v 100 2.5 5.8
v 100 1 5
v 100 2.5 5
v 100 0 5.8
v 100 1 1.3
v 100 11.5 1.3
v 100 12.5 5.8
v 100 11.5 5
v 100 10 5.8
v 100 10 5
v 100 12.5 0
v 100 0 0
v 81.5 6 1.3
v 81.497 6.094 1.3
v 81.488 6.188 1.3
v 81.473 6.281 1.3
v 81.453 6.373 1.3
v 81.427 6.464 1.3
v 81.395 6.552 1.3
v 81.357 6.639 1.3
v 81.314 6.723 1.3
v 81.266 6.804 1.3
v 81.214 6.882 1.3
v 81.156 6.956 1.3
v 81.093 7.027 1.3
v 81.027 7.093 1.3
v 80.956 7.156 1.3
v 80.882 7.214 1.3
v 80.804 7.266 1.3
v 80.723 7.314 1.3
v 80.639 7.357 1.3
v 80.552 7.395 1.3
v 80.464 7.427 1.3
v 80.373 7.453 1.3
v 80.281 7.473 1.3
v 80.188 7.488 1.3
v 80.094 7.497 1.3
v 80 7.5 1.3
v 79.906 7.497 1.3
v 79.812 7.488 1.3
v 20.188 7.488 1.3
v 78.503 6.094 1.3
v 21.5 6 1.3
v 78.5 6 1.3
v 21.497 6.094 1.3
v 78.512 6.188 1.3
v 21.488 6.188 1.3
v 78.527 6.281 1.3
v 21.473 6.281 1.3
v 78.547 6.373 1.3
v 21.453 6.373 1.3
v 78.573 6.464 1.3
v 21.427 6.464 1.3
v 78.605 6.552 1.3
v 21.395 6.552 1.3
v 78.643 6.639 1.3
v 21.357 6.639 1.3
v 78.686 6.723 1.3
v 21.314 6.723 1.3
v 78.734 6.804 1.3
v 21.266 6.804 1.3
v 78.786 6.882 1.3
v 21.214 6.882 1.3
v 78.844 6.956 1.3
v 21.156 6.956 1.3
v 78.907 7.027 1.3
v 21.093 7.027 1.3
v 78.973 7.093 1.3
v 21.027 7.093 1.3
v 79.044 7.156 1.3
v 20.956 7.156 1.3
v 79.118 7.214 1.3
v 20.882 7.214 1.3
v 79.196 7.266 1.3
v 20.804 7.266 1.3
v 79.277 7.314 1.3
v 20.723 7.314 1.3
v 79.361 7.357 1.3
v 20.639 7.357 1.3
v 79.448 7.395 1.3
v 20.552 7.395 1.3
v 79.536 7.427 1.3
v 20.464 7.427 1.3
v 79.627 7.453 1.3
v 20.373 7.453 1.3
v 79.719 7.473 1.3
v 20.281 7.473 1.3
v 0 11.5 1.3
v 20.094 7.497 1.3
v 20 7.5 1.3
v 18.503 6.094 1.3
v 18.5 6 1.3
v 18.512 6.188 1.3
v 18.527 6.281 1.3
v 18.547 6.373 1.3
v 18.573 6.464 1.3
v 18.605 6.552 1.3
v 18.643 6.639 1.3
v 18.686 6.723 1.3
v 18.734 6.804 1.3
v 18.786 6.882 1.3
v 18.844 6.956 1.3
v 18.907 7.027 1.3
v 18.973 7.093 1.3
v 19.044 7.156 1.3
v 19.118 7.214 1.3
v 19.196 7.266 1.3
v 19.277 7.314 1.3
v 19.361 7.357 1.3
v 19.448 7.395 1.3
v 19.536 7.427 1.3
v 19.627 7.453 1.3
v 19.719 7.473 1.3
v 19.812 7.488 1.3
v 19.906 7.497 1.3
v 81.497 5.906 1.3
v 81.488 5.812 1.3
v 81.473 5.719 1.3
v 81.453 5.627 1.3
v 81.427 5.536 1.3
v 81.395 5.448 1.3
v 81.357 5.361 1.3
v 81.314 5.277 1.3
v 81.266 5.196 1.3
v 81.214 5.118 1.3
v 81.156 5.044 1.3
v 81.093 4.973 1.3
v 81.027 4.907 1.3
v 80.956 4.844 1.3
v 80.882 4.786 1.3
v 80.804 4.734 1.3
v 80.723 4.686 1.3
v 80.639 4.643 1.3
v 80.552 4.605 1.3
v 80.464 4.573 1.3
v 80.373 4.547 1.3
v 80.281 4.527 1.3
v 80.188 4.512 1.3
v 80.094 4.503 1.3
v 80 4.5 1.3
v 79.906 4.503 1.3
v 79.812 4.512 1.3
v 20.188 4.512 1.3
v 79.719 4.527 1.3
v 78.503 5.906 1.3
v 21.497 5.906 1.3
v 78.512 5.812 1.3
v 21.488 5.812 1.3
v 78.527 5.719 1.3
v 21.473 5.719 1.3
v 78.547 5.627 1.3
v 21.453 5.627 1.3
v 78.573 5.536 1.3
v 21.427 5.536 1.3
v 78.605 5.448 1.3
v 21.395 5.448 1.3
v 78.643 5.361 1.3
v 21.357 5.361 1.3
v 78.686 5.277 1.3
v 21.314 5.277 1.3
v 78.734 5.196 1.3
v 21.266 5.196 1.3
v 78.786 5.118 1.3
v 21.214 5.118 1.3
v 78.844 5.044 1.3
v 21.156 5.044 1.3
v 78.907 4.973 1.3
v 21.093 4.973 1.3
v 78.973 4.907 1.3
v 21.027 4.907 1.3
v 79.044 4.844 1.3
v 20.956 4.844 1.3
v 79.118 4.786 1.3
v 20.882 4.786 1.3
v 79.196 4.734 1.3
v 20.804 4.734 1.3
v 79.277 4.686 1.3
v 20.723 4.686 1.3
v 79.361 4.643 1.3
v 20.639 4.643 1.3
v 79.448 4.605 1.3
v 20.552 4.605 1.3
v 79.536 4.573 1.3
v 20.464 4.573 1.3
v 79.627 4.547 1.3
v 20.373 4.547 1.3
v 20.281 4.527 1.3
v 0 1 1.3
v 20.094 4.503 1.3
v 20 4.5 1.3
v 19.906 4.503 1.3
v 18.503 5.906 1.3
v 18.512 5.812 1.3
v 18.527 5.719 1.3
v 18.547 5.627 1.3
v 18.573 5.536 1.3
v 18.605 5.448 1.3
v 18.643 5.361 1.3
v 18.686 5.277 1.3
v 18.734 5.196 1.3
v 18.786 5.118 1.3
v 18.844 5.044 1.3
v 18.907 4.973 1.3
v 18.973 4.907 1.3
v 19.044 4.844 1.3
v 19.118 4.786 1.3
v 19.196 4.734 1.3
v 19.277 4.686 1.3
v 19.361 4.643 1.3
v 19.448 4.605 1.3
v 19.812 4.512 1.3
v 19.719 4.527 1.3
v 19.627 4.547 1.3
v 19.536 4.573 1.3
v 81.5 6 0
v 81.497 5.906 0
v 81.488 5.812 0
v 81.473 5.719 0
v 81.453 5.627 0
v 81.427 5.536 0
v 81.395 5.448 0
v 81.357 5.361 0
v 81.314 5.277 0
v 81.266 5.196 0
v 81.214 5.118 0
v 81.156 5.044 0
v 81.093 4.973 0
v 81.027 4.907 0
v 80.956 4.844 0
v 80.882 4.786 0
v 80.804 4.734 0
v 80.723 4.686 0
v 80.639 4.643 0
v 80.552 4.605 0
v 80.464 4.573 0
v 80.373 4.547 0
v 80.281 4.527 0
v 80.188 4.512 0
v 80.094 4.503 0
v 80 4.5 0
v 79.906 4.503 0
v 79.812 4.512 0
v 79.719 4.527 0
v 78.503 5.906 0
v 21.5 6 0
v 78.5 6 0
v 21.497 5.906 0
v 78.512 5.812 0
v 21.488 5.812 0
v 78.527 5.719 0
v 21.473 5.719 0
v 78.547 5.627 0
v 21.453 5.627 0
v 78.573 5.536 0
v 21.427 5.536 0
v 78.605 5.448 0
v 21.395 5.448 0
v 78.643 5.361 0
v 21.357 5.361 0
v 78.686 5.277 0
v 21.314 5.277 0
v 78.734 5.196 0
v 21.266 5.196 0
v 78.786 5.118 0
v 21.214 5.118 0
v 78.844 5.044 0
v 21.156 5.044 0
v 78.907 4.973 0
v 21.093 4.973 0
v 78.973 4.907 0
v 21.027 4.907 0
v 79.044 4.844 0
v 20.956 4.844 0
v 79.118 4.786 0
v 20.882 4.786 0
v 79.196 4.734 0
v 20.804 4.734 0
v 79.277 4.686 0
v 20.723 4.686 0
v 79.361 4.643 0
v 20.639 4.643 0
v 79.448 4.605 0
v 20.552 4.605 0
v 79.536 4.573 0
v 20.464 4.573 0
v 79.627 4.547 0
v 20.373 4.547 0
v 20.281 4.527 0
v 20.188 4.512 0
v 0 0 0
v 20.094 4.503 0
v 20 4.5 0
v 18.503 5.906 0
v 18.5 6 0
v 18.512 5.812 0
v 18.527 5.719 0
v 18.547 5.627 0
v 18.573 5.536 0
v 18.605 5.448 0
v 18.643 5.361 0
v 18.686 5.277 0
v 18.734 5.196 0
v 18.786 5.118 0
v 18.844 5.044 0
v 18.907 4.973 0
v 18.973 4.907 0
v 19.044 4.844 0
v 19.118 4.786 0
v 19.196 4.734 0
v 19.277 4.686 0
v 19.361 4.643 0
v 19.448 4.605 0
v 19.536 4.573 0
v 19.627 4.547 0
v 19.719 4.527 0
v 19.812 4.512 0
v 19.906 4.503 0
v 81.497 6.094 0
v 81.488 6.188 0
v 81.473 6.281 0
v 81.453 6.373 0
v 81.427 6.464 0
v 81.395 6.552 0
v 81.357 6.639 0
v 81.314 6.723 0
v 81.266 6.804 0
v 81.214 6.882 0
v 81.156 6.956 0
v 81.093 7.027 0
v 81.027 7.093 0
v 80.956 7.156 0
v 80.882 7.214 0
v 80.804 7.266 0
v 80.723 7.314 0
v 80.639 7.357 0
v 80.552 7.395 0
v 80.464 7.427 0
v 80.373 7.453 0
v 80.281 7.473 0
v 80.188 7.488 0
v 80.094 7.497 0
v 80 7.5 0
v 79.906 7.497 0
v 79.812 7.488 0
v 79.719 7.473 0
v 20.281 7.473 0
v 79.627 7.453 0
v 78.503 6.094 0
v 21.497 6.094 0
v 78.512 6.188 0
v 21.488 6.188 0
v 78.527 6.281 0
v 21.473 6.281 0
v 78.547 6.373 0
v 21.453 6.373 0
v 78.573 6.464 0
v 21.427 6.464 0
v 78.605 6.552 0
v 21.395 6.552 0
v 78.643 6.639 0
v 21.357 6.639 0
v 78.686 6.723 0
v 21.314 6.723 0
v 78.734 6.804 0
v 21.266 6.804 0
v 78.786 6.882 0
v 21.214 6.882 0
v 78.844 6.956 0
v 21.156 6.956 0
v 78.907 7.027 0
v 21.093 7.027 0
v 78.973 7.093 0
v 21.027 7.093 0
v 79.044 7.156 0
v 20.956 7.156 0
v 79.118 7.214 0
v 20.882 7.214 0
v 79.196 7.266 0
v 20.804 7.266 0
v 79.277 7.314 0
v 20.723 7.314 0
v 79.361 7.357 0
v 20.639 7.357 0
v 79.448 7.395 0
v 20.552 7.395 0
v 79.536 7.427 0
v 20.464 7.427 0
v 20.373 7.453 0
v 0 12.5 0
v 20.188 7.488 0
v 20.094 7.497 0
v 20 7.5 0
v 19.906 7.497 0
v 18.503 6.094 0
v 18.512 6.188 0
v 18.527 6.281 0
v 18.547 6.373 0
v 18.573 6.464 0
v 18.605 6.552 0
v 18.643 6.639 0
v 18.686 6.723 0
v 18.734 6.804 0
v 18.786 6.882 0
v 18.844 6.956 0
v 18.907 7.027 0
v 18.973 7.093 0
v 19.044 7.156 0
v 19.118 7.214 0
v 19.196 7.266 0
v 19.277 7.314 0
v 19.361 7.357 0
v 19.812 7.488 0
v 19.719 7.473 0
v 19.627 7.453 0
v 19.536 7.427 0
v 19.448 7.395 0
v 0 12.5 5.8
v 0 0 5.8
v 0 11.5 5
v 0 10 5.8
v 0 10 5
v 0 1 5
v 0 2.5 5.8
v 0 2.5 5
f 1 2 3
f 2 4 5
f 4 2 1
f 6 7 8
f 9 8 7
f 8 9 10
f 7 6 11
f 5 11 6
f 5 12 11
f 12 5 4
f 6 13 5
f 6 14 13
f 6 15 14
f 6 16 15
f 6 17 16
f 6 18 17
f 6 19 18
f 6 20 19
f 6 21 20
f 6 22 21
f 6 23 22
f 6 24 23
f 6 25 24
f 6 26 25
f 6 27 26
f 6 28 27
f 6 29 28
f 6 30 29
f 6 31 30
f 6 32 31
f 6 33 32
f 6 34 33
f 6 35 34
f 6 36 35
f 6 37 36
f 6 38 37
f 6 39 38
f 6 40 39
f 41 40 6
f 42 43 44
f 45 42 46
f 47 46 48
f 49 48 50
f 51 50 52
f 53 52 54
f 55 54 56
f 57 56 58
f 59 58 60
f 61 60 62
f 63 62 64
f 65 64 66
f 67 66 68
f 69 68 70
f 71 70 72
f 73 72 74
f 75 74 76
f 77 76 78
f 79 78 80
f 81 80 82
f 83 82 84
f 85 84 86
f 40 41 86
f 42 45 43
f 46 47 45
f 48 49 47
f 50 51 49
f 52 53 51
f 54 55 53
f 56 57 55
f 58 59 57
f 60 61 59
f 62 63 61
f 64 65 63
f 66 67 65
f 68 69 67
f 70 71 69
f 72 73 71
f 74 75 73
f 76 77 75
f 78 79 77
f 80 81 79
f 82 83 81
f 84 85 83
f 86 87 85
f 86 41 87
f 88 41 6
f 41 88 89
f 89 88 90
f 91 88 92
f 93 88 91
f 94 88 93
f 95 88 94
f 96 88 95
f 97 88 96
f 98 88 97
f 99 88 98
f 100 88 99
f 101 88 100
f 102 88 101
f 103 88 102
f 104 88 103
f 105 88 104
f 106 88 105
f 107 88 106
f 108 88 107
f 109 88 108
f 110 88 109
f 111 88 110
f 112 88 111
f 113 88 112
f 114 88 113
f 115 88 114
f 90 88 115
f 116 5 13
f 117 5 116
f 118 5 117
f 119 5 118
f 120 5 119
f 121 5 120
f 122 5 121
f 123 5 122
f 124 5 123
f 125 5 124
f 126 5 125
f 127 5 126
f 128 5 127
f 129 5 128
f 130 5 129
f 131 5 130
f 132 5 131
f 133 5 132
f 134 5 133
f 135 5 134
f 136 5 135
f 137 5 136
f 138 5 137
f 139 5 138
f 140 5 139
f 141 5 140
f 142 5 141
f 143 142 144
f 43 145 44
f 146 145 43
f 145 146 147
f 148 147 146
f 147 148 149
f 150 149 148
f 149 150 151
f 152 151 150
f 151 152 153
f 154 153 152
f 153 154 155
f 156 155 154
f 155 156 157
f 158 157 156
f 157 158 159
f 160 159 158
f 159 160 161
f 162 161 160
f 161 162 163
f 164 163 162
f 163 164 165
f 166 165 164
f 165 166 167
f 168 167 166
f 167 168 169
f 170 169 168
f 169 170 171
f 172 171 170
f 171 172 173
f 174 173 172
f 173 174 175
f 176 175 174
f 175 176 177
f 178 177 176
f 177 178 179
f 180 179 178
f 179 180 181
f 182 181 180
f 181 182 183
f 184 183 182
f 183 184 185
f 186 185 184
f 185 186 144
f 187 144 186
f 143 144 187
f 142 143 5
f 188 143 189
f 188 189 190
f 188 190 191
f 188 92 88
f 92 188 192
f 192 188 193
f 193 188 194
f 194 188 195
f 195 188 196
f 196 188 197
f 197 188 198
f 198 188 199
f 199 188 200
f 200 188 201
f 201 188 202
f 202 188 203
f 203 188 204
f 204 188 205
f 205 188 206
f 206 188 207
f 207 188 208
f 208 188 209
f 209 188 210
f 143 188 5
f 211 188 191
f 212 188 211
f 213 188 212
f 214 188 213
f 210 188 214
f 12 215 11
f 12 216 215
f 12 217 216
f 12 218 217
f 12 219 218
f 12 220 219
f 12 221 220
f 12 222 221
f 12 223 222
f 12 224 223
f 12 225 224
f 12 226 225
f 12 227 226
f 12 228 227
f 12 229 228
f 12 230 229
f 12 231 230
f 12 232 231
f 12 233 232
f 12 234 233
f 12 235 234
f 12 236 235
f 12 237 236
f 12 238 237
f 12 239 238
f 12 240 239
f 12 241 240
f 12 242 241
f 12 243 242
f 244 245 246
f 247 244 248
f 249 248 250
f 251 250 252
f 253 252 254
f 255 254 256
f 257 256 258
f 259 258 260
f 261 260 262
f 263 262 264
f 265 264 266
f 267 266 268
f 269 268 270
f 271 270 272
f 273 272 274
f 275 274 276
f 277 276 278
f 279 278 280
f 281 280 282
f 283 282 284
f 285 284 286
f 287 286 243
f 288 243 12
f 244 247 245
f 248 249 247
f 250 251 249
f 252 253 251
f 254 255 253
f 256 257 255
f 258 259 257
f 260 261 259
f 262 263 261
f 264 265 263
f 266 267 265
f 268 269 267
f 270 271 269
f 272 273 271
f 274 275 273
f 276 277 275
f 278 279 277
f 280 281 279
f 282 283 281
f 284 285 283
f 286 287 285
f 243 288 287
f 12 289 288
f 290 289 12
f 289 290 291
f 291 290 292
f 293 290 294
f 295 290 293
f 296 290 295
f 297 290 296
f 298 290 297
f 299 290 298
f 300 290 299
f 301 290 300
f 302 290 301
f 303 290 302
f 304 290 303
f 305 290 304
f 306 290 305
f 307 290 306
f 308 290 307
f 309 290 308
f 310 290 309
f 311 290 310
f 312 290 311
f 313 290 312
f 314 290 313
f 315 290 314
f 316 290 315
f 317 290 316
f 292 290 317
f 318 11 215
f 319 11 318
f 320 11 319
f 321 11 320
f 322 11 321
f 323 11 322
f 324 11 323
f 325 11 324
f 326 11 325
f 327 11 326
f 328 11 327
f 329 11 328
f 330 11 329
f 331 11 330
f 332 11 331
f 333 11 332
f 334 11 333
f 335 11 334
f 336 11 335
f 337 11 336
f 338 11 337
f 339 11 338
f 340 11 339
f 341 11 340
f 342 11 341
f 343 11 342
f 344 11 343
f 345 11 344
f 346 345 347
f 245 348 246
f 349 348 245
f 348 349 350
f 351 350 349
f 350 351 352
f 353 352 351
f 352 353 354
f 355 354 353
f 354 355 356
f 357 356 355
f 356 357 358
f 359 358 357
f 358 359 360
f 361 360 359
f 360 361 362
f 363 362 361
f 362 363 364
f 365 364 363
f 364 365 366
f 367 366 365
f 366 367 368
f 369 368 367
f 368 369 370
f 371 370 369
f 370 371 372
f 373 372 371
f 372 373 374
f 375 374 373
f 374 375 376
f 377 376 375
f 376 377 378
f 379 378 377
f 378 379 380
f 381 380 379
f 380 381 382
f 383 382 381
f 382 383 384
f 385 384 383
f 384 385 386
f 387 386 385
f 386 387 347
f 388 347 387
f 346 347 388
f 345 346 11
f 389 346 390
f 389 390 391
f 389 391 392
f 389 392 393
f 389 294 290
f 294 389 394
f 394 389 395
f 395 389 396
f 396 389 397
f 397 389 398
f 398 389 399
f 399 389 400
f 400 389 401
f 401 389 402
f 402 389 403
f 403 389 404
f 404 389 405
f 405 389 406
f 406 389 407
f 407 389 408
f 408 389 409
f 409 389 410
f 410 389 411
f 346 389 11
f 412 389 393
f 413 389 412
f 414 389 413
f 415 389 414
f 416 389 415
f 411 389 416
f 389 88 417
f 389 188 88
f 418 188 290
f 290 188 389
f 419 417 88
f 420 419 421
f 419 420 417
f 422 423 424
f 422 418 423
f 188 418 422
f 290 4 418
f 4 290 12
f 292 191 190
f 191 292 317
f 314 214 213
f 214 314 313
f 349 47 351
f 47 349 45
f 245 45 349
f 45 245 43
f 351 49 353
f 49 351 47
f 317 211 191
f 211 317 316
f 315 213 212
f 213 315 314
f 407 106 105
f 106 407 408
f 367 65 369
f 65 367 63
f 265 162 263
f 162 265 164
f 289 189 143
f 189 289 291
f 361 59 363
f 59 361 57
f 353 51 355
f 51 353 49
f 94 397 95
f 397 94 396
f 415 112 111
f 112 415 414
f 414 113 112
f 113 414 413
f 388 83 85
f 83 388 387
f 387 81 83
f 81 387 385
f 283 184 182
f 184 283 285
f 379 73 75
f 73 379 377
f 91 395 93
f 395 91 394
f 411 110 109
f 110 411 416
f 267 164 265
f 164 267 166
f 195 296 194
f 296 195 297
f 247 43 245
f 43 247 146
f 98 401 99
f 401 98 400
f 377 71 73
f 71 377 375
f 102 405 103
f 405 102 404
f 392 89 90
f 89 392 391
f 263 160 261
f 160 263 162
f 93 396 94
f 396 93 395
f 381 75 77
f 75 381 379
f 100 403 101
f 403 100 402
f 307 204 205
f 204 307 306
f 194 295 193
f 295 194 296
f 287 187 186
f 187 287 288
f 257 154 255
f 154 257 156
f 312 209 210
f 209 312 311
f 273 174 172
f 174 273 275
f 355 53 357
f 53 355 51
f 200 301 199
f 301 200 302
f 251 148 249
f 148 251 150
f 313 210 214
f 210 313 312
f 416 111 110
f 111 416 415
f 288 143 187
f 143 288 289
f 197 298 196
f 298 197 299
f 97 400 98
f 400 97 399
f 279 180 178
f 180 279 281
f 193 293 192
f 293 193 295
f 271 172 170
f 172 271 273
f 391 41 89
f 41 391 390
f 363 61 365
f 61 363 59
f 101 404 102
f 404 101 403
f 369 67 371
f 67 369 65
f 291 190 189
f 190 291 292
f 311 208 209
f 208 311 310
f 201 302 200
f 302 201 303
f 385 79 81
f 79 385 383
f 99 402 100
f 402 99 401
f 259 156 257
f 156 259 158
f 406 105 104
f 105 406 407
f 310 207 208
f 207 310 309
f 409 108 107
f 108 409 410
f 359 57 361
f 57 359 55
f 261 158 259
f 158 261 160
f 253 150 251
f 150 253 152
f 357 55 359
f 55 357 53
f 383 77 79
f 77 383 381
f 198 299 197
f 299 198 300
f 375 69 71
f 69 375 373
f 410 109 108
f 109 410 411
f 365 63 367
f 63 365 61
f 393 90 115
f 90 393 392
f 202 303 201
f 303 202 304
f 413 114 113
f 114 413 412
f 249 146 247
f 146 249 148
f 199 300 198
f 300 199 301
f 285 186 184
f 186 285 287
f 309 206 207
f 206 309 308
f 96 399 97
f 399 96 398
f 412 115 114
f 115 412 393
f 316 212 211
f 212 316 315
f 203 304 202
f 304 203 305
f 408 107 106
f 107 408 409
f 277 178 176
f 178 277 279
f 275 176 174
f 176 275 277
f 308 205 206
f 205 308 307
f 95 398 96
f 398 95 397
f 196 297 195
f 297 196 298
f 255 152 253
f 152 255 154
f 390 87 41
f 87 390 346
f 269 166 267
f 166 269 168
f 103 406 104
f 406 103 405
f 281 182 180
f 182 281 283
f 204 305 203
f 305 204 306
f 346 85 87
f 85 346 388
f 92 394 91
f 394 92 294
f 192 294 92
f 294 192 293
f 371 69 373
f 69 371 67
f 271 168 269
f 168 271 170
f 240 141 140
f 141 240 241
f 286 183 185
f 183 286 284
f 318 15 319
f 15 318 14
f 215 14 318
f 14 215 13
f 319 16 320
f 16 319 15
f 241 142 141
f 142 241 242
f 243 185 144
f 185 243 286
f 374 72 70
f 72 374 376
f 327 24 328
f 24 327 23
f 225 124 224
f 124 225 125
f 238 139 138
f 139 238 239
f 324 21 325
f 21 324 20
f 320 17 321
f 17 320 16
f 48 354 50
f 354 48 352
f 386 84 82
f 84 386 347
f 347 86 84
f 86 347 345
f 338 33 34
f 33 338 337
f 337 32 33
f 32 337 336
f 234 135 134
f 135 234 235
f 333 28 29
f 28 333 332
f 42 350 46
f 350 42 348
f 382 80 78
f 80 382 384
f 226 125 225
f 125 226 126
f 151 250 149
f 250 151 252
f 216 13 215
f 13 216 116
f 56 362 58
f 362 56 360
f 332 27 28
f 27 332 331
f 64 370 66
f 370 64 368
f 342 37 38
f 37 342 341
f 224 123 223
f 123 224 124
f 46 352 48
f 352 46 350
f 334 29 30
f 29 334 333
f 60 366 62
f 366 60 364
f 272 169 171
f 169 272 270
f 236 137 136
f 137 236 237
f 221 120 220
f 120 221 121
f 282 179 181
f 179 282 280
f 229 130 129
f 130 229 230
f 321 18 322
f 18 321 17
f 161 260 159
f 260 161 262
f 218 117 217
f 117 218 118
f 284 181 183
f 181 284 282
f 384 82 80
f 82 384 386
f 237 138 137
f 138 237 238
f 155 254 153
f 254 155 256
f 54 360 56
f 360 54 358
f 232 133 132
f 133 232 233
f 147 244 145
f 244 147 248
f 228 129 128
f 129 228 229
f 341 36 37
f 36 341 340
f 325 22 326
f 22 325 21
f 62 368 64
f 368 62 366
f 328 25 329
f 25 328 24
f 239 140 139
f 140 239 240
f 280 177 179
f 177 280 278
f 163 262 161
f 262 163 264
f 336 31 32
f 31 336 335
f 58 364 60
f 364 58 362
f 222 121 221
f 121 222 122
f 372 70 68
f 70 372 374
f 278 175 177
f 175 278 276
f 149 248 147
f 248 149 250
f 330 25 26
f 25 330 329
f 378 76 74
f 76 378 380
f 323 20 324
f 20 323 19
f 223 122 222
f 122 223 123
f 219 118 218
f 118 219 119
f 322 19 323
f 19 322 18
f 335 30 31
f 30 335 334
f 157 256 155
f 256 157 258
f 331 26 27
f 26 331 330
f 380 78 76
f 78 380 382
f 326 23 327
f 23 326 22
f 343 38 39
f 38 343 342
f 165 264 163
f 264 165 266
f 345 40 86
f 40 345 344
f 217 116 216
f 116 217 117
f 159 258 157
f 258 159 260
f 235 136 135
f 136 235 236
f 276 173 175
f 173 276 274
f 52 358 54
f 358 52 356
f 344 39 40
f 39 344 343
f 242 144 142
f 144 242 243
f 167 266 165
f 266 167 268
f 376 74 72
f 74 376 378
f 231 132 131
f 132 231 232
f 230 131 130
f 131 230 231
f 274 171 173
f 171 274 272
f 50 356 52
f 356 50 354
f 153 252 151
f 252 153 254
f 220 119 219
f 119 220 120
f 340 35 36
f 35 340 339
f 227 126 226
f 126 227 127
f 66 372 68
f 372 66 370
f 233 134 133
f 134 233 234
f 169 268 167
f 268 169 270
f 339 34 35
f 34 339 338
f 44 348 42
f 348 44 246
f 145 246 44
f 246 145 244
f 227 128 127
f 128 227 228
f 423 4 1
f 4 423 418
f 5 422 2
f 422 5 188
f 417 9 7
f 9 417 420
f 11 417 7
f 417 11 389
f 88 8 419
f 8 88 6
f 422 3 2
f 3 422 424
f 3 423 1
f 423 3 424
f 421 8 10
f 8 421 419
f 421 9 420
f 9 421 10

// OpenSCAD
difference() 
{
cube([100,12,1.3]);
    translate([20,6,0])
    cylinder(r=3/2, h=2.3,$fn=100);
    translate([80,6,0])
    cylinder(r=3/2, h=2.3,$fn=100);
}
cube([100,1,5.8]);
translate([0,11.5,0])
cube([100,1,5.8]);
translate([0,0.5,5])
cube([100,2,0.8]);
translate([0,10,5])
cube([100,1.5,0.8]);
